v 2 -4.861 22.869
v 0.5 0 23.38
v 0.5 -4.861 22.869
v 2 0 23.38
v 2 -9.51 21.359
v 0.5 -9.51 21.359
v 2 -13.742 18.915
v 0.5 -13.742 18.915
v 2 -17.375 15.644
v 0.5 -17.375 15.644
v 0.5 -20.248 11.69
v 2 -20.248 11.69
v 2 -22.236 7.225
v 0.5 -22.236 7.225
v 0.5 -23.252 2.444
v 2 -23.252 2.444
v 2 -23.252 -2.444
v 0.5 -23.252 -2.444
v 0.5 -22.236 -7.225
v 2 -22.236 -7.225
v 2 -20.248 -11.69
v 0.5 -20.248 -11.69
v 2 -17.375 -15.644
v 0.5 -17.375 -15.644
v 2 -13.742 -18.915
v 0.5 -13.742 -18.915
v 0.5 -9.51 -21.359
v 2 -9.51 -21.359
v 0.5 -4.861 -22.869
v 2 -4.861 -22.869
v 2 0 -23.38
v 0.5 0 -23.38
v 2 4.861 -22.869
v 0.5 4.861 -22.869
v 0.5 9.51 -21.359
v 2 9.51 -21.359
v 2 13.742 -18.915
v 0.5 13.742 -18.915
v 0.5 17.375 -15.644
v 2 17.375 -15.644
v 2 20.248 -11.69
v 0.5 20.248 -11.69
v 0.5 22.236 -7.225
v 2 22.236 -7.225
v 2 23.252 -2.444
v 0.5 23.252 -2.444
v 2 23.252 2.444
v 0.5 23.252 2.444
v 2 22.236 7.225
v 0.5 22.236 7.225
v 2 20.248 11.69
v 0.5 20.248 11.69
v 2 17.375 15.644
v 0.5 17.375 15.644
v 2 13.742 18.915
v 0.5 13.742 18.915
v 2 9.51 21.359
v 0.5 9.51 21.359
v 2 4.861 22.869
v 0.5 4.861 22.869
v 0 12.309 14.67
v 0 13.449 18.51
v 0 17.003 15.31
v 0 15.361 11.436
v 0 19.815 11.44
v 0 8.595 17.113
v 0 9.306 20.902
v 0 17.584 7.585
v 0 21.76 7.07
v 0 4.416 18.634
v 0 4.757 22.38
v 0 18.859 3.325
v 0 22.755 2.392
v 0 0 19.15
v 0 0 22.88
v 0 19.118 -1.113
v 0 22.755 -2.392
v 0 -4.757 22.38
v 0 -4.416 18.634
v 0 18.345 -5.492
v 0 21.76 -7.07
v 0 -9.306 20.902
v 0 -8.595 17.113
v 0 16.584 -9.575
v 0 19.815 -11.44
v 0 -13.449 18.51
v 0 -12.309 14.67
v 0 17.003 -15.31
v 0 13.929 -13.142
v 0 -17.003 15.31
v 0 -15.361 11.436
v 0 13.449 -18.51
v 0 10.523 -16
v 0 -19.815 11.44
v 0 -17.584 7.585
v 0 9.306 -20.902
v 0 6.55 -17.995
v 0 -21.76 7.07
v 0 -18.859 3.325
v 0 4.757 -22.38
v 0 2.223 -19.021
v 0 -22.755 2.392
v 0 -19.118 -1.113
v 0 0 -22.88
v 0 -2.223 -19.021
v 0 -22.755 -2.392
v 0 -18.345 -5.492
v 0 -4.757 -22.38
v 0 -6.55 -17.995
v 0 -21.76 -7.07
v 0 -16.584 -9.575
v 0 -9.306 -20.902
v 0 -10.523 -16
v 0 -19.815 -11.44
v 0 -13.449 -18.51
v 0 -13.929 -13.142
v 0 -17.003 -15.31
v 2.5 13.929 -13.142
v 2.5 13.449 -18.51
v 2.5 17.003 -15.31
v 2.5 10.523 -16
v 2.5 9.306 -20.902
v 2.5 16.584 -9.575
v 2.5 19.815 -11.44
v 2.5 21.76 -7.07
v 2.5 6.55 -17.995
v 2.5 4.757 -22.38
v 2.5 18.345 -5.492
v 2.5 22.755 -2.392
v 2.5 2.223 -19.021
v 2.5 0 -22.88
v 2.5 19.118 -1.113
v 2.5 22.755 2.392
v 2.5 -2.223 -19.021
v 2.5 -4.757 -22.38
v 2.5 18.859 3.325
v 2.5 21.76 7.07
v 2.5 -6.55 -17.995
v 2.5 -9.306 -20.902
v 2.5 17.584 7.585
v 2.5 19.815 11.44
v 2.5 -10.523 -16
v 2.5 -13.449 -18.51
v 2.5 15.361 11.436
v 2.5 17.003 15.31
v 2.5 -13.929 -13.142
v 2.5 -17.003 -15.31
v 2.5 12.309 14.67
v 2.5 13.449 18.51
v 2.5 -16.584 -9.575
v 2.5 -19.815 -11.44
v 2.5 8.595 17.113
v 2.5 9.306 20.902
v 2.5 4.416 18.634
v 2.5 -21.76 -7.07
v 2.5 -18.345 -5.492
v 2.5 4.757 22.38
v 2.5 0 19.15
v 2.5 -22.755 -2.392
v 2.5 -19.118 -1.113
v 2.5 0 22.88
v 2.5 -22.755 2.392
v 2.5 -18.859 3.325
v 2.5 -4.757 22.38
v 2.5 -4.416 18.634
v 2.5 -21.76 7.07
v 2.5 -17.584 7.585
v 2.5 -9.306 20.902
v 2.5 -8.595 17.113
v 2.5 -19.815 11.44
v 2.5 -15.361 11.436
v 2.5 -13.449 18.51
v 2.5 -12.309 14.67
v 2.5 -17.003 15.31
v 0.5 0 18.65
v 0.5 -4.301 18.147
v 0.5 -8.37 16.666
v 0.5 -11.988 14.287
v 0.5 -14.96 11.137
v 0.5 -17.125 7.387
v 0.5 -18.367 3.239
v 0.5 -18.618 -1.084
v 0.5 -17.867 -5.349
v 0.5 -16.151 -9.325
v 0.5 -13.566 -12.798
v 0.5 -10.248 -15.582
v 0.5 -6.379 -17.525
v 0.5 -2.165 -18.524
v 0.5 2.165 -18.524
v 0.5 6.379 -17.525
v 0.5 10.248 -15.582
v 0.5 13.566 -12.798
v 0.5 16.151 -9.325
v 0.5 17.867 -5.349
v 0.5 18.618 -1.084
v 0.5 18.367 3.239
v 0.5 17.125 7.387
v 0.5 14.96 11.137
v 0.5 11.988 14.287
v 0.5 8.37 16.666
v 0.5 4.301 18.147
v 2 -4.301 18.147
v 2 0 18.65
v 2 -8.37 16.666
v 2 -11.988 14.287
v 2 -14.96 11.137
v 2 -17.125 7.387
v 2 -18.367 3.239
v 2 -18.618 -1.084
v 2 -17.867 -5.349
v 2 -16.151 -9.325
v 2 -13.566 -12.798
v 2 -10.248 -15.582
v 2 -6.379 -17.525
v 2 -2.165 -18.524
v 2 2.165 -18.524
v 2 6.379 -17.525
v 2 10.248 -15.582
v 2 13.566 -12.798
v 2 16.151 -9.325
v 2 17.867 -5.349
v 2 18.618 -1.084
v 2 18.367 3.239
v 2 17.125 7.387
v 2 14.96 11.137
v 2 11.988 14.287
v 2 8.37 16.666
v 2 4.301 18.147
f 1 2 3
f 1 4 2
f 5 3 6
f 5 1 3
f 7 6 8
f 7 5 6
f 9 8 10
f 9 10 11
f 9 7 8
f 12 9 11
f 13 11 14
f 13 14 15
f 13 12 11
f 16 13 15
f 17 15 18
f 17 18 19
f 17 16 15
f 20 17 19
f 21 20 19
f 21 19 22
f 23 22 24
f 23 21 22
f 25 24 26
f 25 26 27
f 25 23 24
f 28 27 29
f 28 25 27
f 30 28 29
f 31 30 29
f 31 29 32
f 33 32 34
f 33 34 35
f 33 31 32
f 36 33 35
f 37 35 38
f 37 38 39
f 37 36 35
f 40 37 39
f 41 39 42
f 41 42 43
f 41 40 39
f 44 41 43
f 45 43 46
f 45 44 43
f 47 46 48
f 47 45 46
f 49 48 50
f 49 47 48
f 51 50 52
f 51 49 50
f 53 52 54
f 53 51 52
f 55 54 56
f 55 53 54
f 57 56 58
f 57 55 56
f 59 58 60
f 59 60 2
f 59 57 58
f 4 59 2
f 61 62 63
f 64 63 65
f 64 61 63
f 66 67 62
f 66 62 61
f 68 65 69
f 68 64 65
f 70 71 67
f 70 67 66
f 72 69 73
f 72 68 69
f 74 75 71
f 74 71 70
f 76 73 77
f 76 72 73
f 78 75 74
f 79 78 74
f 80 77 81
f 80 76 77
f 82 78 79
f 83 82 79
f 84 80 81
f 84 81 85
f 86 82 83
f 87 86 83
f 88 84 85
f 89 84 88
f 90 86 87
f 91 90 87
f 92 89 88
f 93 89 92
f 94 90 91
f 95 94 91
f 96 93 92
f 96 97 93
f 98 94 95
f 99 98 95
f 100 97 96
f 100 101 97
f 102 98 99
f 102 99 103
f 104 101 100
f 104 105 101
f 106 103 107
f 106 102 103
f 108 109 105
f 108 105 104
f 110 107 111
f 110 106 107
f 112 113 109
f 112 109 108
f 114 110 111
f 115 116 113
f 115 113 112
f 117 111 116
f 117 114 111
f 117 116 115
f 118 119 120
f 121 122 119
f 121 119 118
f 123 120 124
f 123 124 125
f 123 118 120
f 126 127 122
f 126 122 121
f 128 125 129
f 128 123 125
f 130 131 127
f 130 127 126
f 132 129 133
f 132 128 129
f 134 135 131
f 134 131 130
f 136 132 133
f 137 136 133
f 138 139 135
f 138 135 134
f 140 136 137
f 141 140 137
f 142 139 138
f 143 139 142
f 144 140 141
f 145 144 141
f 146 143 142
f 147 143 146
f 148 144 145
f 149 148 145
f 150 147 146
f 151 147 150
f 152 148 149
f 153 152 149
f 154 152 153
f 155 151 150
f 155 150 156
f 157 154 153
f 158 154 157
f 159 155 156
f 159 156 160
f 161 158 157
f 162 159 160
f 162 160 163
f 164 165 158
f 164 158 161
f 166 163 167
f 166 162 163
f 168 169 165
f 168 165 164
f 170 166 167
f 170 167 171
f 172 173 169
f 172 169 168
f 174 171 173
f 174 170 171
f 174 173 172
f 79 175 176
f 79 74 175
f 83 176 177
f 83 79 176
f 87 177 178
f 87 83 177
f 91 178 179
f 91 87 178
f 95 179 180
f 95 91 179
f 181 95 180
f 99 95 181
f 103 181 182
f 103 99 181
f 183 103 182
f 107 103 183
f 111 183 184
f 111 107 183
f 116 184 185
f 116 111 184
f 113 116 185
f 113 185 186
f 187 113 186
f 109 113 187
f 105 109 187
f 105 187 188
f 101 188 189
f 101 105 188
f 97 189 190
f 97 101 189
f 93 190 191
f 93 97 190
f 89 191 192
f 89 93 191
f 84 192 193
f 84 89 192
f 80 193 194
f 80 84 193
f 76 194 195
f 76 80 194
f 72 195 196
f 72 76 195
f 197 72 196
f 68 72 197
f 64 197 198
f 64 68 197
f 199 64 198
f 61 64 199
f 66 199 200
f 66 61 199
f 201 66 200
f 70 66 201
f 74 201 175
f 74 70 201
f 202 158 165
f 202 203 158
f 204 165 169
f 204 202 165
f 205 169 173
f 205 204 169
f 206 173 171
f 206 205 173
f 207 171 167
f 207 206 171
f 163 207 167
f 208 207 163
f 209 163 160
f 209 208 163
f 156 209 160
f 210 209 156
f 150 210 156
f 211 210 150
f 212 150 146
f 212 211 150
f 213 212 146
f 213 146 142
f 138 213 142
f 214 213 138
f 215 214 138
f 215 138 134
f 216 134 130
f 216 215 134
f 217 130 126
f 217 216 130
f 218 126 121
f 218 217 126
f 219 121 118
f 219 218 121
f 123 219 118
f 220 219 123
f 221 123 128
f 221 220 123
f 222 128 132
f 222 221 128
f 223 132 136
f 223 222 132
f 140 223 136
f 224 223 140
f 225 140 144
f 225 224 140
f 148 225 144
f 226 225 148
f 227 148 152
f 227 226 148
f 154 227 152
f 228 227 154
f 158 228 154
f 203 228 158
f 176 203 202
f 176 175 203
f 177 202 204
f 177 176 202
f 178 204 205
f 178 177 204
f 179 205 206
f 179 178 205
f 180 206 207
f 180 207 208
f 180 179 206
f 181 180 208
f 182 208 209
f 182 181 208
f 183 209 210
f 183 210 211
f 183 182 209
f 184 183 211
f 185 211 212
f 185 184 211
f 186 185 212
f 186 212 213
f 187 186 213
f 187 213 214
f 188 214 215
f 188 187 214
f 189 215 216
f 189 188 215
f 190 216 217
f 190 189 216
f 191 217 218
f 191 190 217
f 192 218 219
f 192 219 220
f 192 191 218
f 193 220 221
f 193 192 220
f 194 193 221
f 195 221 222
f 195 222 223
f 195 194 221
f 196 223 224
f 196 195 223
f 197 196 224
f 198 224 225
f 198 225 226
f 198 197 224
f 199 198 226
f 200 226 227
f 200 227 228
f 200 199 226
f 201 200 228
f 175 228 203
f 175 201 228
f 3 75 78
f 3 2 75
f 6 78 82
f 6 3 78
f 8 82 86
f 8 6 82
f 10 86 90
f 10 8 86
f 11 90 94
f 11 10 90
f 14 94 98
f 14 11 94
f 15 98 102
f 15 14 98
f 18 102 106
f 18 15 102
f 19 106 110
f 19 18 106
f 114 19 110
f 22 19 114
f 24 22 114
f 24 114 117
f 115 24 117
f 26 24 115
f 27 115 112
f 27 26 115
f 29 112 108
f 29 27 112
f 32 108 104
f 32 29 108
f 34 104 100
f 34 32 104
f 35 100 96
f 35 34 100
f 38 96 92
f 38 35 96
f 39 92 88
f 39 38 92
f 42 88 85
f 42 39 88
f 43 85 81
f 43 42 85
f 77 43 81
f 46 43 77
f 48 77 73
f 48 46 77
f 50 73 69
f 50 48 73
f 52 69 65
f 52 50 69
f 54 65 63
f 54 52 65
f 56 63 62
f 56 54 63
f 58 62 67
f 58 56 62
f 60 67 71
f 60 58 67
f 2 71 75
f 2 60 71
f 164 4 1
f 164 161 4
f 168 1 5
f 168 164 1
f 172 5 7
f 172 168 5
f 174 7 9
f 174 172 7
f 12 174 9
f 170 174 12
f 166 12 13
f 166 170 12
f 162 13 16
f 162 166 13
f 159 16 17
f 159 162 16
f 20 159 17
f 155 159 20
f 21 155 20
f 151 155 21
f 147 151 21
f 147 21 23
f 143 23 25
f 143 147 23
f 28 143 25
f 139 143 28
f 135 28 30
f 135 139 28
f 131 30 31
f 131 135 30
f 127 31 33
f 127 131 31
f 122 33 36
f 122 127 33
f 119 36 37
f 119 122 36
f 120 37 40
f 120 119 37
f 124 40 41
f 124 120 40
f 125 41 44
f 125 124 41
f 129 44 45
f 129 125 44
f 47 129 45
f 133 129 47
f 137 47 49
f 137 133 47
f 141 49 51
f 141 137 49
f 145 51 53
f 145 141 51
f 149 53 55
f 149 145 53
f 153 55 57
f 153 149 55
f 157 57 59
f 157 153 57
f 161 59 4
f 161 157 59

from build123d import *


with BuildPart() as part:
    # Esquisse1 → Révolution1 (revolve)
    with BuildSketch(Plane.XY, mode=Mode.PRIVATE) as r_volution1_sk:
        Polygon((0, 22.88), (0.5, 23.38), (2, 23.38), (2.5, 22.88), (2.5, 19.15), (2, 18.65), (0.5, 18.65), (0, 19.15), align=None)
    revolve(r_volution1_sk.sketch.rotate(Axis((-10.655084746, 0, 0), (1, 0, 0)), 90), axis=Axis((-10.655084746, 0, 0), (1, 0, 0)))


solid = part.part
